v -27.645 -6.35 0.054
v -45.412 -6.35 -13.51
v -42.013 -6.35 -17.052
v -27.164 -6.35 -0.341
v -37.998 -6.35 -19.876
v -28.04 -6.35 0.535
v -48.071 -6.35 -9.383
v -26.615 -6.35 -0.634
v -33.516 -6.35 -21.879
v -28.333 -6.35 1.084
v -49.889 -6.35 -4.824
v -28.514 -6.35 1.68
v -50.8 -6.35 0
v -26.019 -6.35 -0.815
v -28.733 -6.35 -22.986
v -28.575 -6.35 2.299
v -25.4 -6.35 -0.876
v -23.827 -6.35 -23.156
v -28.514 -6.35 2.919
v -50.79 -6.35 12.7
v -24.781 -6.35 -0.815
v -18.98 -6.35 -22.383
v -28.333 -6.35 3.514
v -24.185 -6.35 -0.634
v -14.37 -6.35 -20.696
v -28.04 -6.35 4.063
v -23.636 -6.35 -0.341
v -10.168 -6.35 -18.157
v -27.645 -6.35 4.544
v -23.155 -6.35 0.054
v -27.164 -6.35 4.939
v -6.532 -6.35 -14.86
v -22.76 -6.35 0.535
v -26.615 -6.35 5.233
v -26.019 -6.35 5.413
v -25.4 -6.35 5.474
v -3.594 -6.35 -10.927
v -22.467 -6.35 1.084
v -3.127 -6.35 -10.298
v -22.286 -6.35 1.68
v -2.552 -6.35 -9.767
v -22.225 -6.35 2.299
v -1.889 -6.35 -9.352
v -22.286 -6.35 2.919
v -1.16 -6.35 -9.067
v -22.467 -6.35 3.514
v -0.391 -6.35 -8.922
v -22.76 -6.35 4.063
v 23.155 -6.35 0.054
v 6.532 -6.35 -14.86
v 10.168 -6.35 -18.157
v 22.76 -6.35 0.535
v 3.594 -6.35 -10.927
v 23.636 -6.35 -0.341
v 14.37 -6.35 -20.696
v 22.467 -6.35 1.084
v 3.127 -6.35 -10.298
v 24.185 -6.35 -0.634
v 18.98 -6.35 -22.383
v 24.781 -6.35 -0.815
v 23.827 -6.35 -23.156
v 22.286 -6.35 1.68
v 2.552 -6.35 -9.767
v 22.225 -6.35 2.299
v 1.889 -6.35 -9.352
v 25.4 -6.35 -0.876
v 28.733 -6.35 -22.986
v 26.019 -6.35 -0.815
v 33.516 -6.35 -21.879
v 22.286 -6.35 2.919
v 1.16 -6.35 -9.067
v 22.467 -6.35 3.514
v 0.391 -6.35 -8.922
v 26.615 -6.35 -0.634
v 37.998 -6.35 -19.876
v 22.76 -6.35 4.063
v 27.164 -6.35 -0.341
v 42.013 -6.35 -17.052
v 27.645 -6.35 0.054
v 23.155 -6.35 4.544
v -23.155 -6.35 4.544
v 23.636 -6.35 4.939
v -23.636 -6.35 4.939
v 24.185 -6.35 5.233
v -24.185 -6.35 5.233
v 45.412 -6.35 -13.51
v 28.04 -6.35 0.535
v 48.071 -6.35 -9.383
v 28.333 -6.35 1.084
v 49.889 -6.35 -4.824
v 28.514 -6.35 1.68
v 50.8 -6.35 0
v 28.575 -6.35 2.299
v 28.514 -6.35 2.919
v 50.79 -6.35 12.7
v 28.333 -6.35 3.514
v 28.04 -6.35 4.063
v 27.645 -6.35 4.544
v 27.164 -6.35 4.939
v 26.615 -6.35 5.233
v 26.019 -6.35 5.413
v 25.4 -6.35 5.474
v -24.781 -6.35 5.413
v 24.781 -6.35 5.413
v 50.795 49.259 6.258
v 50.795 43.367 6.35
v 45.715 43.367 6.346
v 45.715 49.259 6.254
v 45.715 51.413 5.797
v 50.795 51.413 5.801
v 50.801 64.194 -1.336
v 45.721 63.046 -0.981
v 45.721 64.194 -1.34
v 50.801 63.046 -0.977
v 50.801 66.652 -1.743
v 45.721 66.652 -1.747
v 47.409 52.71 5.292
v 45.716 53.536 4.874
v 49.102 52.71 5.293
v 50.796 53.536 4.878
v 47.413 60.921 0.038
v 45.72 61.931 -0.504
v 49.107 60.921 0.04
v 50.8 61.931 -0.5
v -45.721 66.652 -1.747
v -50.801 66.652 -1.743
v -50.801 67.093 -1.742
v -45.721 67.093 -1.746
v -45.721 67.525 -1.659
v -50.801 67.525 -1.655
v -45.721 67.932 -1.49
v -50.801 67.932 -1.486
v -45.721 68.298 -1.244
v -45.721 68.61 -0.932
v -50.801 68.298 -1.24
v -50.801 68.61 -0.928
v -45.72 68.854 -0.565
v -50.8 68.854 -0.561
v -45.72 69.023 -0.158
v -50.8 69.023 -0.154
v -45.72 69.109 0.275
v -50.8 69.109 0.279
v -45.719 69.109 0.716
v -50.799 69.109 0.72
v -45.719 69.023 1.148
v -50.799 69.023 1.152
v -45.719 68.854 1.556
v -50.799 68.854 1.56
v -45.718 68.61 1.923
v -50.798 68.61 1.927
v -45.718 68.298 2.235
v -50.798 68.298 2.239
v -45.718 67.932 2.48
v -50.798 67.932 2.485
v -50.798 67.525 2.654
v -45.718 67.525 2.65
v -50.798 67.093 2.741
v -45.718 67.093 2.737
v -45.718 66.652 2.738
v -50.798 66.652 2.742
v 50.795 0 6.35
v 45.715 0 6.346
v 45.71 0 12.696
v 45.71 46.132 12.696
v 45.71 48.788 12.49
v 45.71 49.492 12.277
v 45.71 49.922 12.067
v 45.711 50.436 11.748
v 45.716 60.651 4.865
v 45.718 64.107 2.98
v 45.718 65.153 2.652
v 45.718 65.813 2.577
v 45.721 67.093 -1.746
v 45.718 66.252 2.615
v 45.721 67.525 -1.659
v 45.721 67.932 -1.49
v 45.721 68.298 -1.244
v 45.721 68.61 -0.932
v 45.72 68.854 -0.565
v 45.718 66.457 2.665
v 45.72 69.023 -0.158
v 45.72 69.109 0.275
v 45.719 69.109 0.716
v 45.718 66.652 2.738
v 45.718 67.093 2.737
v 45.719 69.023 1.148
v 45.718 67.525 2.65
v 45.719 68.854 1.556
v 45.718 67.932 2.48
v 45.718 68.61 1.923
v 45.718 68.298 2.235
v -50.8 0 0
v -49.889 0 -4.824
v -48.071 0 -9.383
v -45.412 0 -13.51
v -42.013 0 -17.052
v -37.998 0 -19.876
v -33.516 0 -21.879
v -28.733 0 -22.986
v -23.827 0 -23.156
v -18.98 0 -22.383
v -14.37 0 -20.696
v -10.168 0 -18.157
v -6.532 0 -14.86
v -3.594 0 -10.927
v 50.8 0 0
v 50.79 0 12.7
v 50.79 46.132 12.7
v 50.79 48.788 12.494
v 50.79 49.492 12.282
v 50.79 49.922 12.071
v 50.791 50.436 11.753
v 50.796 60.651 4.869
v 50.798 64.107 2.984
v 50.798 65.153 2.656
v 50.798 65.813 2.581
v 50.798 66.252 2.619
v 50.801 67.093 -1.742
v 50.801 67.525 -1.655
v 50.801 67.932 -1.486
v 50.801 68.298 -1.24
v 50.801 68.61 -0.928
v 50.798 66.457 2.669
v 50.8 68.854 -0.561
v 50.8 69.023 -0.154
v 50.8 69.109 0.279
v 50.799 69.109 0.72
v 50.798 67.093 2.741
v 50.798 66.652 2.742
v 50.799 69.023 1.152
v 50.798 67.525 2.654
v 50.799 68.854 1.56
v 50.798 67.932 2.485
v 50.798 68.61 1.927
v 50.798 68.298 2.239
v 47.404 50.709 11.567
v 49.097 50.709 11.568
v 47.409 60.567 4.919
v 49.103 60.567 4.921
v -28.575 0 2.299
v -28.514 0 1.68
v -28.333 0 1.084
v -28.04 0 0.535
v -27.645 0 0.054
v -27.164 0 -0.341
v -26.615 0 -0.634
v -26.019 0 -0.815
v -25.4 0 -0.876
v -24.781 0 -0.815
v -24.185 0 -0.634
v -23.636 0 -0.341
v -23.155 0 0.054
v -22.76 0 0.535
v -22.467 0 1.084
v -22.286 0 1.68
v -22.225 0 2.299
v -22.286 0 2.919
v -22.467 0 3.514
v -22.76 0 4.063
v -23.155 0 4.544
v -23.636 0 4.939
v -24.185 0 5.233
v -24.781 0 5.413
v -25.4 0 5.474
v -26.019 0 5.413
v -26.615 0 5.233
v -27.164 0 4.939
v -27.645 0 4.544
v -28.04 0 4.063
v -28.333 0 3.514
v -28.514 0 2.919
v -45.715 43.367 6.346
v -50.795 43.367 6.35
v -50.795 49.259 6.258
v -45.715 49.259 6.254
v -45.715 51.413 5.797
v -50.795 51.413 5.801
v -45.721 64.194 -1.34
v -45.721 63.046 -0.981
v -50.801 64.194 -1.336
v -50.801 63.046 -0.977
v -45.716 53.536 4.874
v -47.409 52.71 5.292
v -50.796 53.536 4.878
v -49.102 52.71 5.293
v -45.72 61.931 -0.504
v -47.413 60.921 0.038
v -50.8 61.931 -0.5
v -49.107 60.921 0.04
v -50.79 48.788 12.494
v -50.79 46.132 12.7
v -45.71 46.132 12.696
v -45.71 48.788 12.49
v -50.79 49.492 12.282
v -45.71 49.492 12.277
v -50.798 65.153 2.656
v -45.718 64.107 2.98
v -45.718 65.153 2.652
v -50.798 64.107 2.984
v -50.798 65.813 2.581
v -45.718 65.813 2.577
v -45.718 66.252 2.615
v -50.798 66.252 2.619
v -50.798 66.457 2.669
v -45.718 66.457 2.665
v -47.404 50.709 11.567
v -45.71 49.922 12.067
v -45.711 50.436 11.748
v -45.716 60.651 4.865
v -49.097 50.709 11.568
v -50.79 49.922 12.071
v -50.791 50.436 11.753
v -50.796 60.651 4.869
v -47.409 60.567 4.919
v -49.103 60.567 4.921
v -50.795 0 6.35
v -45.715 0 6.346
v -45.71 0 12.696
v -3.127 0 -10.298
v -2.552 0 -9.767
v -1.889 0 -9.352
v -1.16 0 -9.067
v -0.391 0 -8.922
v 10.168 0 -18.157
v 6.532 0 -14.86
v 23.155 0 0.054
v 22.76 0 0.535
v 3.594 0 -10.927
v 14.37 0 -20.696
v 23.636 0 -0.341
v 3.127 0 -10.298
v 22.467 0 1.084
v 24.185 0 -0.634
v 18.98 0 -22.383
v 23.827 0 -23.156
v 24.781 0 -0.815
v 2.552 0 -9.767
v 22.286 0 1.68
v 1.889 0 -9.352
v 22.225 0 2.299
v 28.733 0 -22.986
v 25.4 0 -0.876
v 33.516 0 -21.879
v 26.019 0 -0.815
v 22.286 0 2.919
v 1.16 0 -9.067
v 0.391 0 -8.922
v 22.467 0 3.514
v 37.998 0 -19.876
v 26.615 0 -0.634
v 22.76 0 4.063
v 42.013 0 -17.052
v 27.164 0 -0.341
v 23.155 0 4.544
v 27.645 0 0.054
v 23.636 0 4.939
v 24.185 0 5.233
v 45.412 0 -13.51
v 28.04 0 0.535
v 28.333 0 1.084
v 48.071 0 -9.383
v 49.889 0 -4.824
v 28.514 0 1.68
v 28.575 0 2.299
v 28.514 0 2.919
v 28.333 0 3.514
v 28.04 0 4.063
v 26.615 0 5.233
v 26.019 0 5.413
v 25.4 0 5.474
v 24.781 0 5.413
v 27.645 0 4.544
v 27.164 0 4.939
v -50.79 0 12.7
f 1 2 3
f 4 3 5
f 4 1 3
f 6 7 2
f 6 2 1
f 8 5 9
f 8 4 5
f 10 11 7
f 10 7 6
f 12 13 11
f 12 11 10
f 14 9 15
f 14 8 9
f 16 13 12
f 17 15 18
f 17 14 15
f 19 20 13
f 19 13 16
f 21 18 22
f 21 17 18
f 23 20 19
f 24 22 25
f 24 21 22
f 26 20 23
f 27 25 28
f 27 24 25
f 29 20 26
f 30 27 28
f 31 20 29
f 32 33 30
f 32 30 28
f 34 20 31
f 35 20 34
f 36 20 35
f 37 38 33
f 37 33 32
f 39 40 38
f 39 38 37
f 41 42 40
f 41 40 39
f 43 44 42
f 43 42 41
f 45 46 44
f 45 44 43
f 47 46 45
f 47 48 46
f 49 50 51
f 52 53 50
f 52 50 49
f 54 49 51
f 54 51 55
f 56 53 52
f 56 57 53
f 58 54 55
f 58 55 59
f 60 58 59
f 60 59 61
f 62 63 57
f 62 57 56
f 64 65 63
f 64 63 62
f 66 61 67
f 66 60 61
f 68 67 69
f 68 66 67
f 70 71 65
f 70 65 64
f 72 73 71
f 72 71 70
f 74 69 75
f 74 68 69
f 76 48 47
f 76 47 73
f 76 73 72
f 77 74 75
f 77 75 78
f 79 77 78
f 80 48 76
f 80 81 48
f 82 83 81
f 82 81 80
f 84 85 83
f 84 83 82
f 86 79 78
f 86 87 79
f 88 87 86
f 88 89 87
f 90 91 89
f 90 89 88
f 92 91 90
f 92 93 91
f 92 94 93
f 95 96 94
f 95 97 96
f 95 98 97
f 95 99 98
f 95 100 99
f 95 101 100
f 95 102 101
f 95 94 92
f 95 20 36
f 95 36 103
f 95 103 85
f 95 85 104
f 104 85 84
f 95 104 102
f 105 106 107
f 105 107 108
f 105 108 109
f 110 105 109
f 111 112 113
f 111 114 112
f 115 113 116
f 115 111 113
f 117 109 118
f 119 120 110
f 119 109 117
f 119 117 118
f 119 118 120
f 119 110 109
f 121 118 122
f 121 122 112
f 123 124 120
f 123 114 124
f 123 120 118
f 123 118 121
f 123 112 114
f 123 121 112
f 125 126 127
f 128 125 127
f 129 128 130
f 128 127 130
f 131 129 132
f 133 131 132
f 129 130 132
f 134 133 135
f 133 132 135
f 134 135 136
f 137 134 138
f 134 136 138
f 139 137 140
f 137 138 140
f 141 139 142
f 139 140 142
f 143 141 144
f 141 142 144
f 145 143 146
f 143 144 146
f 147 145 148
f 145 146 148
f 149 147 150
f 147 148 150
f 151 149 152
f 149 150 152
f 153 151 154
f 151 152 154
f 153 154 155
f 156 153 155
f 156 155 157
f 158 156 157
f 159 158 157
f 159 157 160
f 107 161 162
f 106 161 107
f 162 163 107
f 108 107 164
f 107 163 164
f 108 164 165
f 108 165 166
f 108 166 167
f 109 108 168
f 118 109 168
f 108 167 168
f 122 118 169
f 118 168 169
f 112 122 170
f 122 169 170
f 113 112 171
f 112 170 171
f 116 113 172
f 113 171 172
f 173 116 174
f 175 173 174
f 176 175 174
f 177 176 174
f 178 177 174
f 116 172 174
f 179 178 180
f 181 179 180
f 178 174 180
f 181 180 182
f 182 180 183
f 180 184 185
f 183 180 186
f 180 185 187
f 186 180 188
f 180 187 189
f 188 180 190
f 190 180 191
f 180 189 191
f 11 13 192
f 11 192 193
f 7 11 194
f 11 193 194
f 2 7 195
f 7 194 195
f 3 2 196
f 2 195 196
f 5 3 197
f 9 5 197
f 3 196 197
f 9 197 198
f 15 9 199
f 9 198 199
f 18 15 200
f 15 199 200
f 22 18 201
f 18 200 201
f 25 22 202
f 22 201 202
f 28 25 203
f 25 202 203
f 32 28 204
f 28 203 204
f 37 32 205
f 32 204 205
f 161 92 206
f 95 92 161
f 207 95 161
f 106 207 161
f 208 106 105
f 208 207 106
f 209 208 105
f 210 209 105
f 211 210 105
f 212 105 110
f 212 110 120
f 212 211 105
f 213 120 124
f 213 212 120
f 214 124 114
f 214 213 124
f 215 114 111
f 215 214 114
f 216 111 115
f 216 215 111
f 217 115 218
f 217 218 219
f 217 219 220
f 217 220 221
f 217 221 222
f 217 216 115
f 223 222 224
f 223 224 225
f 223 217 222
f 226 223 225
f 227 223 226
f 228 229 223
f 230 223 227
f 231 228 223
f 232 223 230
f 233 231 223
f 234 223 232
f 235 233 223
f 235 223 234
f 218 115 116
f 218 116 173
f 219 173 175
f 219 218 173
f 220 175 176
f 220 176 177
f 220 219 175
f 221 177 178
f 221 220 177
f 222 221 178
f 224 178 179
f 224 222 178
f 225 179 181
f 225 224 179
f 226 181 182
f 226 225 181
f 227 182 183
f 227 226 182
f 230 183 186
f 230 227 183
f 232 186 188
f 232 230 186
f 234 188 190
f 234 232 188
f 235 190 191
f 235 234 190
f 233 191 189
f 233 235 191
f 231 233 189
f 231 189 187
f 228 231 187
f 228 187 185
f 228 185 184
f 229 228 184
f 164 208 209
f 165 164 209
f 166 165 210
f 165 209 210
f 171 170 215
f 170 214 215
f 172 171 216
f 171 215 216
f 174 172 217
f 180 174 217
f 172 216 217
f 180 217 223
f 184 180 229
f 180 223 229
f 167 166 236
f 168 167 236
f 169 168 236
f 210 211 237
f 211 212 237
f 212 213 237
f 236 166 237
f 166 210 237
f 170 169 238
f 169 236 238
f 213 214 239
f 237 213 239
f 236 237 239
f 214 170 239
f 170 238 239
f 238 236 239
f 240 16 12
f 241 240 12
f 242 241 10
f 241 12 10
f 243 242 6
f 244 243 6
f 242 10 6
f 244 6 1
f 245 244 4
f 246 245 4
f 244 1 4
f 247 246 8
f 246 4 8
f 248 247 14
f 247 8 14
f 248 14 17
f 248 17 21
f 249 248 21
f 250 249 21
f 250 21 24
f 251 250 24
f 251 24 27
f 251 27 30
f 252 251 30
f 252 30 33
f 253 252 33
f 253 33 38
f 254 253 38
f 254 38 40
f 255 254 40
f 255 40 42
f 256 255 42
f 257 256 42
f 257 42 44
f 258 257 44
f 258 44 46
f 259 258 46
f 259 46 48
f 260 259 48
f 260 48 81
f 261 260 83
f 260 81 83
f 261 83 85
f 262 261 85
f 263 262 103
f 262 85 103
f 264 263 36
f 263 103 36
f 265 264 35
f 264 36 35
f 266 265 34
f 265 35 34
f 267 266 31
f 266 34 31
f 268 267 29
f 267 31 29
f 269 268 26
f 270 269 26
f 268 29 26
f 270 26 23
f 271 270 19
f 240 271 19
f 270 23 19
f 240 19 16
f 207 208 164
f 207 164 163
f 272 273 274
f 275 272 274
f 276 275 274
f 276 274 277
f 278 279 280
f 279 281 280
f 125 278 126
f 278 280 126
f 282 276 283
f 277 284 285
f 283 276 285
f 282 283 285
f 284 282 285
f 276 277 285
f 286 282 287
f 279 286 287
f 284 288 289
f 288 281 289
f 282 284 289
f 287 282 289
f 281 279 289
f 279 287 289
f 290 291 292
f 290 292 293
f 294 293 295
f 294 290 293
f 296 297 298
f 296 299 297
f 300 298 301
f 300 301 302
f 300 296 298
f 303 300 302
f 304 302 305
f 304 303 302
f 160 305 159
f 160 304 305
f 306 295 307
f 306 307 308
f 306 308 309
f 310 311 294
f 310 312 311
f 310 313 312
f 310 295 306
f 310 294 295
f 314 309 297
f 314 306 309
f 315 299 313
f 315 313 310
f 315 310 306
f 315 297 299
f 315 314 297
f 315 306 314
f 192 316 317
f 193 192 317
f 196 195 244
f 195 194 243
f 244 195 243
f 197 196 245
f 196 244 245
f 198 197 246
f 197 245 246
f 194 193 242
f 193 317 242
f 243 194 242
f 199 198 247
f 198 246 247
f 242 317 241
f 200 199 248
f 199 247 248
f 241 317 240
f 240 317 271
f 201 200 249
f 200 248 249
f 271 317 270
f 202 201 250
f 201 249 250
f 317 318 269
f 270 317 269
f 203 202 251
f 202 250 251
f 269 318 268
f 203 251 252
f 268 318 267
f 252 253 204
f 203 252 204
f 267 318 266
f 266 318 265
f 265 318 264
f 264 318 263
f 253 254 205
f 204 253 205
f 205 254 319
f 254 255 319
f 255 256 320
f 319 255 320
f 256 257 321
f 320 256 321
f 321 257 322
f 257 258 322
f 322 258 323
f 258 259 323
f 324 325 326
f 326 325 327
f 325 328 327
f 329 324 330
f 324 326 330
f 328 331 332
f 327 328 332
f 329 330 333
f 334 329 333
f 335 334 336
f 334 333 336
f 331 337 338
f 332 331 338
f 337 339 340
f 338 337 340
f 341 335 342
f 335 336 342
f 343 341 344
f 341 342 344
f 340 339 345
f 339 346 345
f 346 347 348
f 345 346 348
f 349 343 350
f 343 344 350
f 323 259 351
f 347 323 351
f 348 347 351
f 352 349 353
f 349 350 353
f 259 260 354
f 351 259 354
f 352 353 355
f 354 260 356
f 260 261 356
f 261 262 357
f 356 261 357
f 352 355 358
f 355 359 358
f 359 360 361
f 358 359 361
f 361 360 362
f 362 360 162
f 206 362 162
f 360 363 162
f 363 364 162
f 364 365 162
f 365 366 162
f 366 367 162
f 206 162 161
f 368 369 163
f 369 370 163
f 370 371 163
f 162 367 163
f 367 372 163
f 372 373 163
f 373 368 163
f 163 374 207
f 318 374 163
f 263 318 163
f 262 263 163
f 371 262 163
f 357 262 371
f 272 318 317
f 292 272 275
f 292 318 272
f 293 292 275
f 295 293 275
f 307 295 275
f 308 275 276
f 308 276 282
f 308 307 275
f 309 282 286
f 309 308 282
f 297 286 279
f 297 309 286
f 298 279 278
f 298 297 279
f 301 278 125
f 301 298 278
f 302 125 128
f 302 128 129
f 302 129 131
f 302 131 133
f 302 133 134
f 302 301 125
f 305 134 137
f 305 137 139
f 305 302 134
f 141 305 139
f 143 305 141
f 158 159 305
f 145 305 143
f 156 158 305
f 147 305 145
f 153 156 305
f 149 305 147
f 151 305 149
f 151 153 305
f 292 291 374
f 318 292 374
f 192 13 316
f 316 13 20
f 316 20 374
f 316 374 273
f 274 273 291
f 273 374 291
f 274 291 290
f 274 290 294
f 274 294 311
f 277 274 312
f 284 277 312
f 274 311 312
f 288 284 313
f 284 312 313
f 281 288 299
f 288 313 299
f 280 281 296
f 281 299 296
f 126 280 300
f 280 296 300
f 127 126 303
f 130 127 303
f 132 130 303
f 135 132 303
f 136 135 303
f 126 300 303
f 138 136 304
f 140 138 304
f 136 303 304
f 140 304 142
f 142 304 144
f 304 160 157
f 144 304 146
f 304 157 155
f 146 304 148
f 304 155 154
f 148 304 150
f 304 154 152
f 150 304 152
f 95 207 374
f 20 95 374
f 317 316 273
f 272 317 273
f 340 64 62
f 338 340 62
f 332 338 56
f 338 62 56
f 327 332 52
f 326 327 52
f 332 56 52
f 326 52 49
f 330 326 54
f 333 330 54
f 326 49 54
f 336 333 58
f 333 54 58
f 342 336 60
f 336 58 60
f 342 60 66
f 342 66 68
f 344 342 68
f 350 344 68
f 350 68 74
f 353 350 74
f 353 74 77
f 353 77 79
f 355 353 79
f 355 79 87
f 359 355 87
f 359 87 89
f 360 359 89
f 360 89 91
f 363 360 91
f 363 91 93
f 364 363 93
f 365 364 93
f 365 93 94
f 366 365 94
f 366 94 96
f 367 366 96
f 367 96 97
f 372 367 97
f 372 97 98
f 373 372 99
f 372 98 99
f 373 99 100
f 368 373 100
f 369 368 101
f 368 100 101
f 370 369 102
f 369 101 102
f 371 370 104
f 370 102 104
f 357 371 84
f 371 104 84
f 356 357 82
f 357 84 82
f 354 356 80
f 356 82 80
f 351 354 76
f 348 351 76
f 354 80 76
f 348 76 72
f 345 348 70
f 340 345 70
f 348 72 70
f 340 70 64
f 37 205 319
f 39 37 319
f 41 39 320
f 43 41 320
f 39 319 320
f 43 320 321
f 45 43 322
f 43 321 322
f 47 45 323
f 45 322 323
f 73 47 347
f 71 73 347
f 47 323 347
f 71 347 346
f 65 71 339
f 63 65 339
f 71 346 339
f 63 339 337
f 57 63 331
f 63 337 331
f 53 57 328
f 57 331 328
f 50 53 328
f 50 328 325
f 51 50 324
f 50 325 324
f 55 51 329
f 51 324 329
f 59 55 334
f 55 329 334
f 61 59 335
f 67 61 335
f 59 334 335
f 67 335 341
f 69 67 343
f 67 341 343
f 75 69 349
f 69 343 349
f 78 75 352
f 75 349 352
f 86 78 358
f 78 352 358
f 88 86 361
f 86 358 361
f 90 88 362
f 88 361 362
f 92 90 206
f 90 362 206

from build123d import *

# Parameters (mm, degrees)
F1_DEPTH = 6.35
F3_DEPTH = 5.08
F6_D     = 6.35


with BuildPart() as f1:
    # F0 (on Front) → F1 (new body)
    with BuildSketch(Plane.XZ):
        with BuildLine():
            Line((-50.789758563, 12.7), (-50.8, 0))
            ThreePointArc((-50.8, 0), (-31.1513127772, -22.5475967725), (-3.5936811473, -10.9268408269))
            ThreePointArc((-3.5936811473, -10.9268408269), (0, -8.9034761257), (3.5936811473, -10.9268408269))
            ThreePointArc((3.5936811473, -10.9268408269), (31.1513127772, -22.5475967725), (50.8, 0))
            Line((50.8, 0), (50.789758563, 12.7))
            Line((50.789758563, 12.7), (0, 12.7))
            Line((0, 12.7), (-50.789758563, 12.7))
        make_face()
    extrude(amount=F1_DEPTH)

    # F2 (on face) → F3 (join)
    with BuildSketch(Plane(origin=(50.7999669647, 0, 0.0409657212), x_dir=(0, 1, 0), z_dir=(0.9999996748, 0, 0.0008064121))):
        with BuildLine():
            Line((46.1317837944, 12.6590383949), (0, 12.6590383949))
            Line((0, 12.6590383949), (0, 6.3090363302))
            Line((0, 6.3090363302), (43.3671333809, 6.3090363302))
            add(Edge.make_bspline(
                [(43.3671333809, 6.3090363302), (47.8048958927, 6.4029112237), (52.3956002369, 6.5378512338), (60.8254648697, -0.5707092536), (64.4781213146, -1.5761370426), (66.6516050696, -1.7843674764)],
                knots=[0, 0, 0, 0, 0.3549617082, 0.7163958478, 1, 1, 1, 1], degree=3))
            ThreePointArc((66.6516050696, -1.7843674764), (69.1195081439, 0.4583984006), (66.6516050696, 2.7011642776))
            add(Edge.make_bspline(
                [(46.1317837944, 12.6590383949), (49.0594556176, 12.5911172202), (50.0191314518, 12.0839436725), (60.2418071998, 4.8232645807), (65.3014332056, 2.1007801406), (66.6516050696, 2.7011642776)],
                knots=[0, 0, 0, 0, 0.2660253484, 0.6885067526, 1, 1, 1, 1], degree=3))
        make_face()
    extrude(amount=-F3_DEPTH)

    # F4: F1 across plane


with BuildPart() as f1_1:
    add(f1.part)
    add(f1.part.mirror(Plane.YZ))

    # F6 (through all)
    with Locations(Plane(origin=(0, 0, 0), x_dir=(1, 0, 0), z_dir=(0, 1, 0))):
        with Locations((25.4, -2.2993200155), (-25.4, -2.2993200155)):
            Hole(F6_D / 2)


solid = f1_1.part
